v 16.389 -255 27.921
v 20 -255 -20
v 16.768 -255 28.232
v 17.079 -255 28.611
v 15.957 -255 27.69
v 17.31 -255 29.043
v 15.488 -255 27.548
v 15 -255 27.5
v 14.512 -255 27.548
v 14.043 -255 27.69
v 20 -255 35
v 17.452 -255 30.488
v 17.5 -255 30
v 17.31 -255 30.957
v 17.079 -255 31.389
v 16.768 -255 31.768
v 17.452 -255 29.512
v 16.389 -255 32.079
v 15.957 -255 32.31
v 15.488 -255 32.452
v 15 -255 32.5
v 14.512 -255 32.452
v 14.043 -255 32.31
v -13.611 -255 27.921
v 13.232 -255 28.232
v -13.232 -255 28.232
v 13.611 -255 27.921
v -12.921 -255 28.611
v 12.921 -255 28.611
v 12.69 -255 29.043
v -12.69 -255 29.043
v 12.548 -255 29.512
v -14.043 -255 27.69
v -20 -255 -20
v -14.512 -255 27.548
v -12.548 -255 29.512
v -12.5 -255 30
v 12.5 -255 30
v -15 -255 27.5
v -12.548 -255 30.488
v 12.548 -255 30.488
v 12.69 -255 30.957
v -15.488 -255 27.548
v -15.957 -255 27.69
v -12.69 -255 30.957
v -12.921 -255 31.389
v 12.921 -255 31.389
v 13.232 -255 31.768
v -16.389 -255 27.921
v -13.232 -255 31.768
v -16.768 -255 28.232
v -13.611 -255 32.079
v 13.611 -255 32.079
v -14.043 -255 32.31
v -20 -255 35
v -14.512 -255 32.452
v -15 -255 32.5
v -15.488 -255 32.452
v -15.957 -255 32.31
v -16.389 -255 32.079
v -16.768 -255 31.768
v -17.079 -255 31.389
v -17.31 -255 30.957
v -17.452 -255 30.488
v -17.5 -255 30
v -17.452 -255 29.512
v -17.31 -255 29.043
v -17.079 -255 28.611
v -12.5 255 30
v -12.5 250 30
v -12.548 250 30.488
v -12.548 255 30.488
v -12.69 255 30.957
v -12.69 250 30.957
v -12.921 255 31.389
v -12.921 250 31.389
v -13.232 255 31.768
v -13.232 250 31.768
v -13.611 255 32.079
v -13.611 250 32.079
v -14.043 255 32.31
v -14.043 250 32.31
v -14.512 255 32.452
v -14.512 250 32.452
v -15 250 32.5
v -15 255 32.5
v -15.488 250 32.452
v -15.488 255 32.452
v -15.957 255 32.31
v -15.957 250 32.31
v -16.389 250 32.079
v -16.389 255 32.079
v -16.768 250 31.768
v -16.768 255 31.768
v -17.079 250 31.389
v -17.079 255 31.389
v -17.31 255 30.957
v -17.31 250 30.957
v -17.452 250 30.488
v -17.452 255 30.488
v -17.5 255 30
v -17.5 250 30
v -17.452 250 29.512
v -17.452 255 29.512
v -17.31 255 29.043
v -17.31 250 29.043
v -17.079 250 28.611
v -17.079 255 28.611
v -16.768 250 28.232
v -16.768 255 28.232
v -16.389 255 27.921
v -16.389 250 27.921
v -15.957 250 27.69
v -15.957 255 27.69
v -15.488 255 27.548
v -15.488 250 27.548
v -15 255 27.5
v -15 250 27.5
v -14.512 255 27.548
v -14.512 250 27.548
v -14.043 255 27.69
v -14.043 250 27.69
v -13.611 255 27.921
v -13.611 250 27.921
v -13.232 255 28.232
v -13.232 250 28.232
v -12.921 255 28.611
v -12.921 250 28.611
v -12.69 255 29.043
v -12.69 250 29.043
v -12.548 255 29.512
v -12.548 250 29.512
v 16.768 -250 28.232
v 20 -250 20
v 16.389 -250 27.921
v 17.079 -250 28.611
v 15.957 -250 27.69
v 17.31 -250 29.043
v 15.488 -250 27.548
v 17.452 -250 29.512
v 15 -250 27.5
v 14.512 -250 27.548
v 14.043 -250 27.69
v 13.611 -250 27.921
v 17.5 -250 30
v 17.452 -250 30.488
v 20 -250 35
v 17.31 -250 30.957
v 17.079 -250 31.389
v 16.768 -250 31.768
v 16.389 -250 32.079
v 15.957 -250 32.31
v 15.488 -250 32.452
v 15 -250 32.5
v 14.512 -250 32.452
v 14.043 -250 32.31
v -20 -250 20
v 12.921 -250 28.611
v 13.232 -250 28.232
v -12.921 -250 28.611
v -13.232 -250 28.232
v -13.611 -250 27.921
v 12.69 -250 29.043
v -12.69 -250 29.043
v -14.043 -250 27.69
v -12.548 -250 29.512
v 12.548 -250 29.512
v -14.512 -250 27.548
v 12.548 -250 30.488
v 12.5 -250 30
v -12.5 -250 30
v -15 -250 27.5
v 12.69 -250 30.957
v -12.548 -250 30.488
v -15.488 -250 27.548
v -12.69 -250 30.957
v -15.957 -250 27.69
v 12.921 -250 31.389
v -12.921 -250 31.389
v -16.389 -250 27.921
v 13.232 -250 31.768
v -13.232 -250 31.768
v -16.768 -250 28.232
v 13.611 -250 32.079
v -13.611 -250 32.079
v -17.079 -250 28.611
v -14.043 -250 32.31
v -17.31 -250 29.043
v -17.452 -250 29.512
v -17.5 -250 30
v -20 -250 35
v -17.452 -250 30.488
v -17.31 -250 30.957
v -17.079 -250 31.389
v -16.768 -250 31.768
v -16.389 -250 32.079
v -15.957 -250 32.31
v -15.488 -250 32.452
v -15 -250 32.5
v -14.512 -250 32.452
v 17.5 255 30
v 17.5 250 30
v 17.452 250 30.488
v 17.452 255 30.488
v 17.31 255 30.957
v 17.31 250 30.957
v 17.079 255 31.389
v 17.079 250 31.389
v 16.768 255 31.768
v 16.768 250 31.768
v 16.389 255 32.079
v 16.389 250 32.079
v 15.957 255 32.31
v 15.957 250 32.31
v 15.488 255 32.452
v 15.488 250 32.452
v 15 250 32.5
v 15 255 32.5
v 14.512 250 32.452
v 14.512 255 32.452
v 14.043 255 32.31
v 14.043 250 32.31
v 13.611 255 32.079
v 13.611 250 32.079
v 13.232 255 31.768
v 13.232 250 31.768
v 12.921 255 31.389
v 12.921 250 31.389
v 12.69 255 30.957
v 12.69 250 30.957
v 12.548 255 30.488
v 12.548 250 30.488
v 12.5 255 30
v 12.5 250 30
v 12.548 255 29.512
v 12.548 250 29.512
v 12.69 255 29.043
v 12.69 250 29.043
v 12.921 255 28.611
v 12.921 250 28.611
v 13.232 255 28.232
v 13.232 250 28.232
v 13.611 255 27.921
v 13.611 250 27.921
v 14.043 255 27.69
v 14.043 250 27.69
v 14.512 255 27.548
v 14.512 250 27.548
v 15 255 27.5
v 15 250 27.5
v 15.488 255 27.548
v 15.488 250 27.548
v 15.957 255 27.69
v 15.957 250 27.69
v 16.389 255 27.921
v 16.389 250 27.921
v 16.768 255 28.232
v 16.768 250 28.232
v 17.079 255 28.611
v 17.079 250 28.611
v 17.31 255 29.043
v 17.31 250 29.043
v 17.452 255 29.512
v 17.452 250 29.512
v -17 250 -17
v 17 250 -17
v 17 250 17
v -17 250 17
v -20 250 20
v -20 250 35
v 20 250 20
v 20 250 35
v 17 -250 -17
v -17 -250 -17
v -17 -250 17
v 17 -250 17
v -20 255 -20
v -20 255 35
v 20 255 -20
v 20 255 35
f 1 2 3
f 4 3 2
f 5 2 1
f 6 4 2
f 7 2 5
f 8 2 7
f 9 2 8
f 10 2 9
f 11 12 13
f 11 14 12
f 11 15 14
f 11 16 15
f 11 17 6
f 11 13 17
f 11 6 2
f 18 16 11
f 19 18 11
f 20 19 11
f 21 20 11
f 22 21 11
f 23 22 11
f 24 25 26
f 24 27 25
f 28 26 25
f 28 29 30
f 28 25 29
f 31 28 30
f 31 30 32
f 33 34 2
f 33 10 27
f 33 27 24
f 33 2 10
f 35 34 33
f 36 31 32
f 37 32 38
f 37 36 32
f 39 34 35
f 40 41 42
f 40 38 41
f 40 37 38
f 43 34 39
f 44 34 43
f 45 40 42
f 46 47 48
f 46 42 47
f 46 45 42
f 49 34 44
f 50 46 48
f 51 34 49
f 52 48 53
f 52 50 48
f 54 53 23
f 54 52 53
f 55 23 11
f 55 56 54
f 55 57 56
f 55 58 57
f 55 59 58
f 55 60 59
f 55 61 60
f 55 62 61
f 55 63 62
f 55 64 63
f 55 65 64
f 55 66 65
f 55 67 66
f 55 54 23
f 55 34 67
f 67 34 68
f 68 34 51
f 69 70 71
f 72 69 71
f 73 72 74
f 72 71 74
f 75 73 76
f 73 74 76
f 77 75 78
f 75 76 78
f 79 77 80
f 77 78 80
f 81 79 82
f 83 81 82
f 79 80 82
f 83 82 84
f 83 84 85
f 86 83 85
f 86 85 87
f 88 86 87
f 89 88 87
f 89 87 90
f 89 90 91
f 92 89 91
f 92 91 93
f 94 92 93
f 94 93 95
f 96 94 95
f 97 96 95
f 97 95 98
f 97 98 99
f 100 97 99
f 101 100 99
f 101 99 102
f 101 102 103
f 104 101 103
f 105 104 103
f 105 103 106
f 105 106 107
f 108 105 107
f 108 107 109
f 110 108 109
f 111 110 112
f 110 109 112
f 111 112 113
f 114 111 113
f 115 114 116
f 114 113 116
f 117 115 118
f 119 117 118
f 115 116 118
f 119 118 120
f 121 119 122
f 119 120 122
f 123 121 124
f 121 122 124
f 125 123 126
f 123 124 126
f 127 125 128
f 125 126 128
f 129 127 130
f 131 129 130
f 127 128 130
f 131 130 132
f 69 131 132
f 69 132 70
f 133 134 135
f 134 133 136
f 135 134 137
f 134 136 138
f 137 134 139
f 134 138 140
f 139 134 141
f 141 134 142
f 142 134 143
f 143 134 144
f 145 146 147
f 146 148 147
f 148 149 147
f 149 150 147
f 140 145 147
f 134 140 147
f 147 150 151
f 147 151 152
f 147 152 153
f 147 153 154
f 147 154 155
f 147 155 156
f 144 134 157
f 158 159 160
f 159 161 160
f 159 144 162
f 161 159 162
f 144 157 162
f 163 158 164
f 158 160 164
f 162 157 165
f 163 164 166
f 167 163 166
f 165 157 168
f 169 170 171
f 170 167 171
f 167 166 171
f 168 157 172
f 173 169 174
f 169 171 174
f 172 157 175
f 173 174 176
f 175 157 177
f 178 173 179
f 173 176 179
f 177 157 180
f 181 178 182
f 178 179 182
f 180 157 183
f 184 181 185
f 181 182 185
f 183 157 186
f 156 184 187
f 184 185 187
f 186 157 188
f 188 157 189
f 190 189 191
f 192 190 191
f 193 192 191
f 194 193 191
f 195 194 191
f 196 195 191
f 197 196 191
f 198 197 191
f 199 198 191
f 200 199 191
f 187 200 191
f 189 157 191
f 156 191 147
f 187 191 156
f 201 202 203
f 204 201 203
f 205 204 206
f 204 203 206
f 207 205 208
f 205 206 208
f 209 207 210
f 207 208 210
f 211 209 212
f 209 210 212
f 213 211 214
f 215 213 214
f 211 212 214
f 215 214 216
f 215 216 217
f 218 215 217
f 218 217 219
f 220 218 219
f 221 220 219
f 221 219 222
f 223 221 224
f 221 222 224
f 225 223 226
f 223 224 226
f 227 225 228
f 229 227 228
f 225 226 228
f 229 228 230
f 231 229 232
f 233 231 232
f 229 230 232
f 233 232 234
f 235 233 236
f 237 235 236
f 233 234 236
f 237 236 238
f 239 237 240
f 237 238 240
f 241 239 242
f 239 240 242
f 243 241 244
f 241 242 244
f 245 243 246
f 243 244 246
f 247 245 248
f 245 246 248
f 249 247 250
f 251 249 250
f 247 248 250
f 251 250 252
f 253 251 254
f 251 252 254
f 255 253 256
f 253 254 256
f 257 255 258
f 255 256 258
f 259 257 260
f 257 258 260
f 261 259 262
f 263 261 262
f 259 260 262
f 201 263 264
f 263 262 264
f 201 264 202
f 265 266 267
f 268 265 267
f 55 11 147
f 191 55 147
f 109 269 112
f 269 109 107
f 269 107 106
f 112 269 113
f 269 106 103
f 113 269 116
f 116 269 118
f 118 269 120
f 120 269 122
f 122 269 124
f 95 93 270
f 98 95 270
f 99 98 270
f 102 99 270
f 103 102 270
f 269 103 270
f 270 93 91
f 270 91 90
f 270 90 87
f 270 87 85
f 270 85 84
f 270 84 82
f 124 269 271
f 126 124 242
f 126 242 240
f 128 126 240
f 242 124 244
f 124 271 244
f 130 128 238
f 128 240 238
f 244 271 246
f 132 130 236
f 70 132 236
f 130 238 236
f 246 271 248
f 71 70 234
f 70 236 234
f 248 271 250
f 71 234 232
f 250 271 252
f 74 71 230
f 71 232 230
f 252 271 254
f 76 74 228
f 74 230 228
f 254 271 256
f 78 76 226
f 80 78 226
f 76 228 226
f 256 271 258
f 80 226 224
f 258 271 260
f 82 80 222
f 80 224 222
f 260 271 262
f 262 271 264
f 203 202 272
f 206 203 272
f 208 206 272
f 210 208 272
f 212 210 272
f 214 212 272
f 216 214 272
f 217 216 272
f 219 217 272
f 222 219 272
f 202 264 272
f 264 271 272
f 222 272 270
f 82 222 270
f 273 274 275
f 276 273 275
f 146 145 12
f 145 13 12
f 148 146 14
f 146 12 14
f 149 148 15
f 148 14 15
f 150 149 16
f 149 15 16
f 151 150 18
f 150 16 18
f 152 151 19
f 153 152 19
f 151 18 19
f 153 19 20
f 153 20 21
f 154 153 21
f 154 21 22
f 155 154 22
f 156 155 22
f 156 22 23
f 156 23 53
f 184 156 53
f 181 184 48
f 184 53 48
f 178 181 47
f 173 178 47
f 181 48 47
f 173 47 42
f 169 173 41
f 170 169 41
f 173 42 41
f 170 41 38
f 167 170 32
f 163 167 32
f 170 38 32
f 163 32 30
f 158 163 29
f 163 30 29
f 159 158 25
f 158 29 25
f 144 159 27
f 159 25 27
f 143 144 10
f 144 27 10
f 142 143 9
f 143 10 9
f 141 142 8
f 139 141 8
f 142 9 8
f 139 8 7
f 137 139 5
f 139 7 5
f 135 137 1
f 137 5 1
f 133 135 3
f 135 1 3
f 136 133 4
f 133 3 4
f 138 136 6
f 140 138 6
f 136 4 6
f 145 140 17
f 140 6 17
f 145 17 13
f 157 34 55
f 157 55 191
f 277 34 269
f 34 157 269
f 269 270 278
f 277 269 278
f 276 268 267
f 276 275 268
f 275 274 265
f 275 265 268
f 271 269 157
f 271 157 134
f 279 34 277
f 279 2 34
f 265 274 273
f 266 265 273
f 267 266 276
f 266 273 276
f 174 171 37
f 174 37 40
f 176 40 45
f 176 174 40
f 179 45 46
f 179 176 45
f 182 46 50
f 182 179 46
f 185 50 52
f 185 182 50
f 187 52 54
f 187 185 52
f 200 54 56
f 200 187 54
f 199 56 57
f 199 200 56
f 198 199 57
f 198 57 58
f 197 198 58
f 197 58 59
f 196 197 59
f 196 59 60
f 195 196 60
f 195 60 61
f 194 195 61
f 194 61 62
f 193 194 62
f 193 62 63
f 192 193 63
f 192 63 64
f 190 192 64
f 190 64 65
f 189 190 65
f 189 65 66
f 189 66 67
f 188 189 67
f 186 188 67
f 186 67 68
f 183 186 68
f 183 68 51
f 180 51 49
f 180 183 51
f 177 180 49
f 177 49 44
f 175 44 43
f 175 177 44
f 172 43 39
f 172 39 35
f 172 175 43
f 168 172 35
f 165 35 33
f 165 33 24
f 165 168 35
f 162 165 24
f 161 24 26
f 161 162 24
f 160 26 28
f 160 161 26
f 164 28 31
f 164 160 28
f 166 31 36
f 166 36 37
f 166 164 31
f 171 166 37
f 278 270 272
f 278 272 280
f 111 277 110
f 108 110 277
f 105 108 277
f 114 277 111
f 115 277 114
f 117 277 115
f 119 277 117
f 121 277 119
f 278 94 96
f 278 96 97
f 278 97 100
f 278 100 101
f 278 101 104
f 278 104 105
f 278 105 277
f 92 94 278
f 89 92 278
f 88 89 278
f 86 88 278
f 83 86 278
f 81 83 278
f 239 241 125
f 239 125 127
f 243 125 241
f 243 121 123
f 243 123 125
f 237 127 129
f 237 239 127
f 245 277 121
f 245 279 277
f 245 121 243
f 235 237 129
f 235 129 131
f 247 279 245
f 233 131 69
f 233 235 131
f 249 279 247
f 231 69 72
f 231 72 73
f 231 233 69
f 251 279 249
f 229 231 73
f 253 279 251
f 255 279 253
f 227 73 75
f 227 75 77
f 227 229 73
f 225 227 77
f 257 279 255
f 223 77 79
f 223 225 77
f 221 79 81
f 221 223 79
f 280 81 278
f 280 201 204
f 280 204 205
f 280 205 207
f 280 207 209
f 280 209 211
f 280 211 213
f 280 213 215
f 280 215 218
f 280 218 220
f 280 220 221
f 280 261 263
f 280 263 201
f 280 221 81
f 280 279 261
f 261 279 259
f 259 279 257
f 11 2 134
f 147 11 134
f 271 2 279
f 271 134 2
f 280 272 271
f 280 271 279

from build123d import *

# Parameters (mm, degrees)
F0_W     = 40
F0_H     = 40
F0_W_2   = 34
F0_H_2   = 34
F1_DEPTH = 250
F2_W     = 5
F2_H     = 55
F3_DEPTH = 20
F4_R     = 2.5
F5_DEPTH = 255


with BuildPart() as f1:
    # F0 (on Front) → F1 (new body, symmetric)
    with BuildSketch(Plane.XZ):
        Rectangle(F0_W, F0_H)
        Rectangle(F0_W_2, F0_H_2, mode=Mode.SUBTRACT)
    extrude(amount=F1_DEPTH, both=True)

    # F2 (on Right) → F3 (join, symmetric)
    with BuildSketch(Plane.YZ):
        with Locations((-252.5, 7.5)):
            Rectangle(F2_W, F2_H)
        with Locations((252.5, 7.5)):
            Rectangle(F2_W, F2_H)
    extrude(amount=F3_DEPTH, both=True)

    # F4 (on Front) → F5 (cut, symmetric)
    with BuildSketch(Plane.XZ):
        with Locations((-15, 30)):
            Circle(F4_R)
        with Locations((15, 30)):
            Circle(F4_R)
    extrude(amount=F5_DEPTH, both=True, mode=Mode.SUBTRACT)


solid = f1.part
